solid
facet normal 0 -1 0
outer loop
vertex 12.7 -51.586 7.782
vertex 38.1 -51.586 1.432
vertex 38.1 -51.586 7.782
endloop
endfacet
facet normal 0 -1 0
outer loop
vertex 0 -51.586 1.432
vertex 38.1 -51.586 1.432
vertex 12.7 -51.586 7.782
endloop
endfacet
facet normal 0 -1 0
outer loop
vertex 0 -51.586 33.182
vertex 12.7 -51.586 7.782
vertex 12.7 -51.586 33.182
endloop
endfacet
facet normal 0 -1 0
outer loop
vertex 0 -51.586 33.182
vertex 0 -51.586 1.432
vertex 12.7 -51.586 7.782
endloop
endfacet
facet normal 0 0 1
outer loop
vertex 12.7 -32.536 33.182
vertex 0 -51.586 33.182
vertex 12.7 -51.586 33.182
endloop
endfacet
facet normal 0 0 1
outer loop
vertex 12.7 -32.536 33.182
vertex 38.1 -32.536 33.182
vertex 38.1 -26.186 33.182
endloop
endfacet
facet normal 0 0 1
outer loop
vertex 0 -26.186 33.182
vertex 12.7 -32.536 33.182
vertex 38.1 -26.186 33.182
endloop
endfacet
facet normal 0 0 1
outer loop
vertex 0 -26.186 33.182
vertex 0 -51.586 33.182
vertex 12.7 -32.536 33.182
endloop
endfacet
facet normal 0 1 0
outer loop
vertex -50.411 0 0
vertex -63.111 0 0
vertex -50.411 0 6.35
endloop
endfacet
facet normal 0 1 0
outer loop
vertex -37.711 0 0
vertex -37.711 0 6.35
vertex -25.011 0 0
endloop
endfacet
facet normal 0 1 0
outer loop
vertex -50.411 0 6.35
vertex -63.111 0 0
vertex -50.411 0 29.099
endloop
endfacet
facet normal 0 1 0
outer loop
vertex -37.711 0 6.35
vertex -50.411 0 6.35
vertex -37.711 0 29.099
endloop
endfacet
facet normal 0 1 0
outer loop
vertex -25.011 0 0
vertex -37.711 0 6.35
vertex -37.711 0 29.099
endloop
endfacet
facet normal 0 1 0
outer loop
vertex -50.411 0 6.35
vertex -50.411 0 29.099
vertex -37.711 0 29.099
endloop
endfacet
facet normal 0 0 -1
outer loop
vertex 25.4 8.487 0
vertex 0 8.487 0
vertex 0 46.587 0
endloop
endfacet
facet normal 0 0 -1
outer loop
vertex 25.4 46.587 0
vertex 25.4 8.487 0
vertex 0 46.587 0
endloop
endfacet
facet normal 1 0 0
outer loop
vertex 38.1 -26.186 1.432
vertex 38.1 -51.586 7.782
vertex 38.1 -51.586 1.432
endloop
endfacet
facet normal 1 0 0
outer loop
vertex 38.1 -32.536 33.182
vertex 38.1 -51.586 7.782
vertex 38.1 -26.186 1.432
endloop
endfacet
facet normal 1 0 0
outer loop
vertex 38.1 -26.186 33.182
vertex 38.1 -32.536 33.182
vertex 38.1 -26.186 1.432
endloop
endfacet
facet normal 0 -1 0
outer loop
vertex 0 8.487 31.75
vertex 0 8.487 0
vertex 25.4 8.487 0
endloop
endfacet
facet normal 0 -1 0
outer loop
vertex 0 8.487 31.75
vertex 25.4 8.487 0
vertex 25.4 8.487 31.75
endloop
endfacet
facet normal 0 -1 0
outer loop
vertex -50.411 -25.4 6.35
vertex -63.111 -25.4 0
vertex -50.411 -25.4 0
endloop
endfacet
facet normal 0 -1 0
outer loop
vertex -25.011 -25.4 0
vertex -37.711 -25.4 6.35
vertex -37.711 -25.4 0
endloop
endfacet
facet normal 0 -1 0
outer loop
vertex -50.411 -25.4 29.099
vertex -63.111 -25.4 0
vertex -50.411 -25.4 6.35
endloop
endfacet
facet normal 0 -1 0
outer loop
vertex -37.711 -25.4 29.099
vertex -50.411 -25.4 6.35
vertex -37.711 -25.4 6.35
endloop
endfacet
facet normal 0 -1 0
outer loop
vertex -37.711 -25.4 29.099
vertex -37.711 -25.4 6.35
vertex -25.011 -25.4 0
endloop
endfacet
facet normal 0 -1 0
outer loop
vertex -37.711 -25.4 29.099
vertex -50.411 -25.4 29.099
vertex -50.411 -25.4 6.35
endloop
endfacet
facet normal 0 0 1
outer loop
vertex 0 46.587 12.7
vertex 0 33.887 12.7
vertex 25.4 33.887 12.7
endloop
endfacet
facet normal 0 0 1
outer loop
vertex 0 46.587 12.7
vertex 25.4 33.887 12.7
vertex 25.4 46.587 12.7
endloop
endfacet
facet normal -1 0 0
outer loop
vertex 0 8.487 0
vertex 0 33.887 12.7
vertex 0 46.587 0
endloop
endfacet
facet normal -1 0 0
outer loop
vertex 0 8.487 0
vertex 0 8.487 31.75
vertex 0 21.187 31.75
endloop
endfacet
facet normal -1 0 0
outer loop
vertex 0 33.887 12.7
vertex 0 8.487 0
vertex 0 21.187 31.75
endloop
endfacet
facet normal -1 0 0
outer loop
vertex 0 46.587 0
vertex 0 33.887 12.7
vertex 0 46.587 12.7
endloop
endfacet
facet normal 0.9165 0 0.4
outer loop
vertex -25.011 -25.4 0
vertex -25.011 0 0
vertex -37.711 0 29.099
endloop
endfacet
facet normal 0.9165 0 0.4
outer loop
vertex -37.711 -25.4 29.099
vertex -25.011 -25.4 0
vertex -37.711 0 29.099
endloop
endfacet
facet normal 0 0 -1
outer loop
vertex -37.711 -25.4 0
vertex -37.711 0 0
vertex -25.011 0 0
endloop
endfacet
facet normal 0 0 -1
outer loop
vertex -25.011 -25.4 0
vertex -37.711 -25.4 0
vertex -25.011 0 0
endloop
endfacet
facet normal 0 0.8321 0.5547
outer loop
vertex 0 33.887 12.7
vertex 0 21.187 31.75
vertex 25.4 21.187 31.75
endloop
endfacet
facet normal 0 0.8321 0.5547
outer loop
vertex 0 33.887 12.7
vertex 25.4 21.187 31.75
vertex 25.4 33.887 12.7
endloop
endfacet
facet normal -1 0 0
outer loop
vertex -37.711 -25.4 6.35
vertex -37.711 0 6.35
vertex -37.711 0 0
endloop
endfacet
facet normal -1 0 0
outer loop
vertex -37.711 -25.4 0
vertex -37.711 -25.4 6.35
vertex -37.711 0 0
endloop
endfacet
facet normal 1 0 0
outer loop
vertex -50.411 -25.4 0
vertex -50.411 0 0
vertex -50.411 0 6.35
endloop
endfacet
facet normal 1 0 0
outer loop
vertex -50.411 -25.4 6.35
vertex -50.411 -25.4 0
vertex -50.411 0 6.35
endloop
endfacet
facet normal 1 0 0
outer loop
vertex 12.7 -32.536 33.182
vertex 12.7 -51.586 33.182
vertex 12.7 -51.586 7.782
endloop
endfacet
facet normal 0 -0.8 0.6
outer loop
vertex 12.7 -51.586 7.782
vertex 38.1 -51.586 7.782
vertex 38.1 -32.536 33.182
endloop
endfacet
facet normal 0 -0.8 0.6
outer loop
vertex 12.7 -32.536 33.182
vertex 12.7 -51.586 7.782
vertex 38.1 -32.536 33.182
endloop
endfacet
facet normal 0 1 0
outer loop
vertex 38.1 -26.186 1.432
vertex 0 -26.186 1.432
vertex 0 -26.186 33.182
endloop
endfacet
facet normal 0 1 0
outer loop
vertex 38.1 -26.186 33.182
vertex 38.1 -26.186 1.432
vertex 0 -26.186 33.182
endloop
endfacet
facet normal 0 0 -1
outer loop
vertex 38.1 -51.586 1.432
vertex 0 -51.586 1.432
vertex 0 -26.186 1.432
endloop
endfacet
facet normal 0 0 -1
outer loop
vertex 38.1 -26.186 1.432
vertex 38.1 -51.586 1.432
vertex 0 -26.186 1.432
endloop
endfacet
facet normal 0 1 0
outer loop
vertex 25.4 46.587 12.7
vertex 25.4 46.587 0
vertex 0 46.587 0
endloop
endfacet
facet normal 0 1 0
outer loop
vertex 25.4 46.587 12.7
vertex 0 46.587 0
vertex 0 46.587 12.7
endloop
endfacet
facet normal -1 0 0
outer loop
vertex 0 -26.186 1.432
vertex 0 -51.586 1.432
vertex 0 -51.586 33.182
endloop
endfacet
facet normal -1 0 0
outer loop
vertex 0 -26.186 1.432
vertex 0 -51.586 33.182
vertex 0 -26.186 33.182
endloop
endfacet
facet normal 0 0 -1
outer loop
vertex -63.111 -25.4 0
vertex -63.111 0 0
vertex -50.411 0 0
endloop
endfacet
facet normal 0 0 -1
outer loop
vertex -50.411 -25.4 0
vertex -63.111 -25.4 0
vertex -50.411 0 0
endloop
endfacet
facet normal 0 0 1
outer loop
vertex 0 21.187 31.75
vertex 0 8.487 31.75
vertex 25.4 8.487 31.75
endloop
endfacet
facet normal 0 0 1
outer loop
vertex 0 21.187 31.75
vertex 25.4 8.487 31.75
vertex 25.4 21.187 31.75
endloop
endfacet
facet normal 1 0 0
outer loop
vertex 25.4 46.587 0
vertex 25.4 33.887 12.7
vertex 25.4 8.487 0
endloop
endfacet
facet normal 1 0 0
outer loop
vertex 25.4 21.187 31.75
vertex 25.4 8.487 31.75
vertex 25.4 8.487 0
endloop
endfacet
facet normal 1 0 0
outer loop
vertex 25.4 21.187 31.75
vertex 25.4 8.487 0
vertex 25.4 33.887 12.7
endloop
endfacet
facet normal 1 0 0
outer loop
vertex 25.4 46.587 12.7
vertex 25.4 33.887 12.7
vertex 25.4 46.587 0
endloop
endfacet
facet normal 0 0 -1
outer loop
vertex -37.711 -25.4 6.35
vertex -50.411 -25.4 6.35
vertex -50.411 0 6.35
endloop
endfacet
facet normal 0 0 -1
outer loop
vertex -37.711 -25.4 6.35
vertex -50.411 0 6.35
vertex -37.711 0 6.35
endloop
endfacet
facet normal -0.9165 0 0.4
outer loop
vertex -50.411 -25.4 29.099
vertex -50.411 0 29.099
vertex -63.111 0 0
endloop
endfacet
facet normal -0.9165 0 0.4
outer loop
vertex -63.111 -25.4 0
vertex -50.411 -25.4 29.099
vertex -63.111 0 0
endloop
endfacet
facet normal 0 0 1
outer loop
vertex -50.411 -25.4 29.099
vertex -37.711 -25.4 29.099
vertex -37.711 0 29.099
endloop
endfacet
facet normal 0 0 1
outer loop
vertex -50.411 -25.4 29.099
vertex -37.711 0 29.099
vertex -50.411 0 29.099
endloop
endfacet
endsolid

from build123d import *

# Parameters (mm, degrees)
F0_W     = 25.4
F0_H     = 31.75
F1_DEPTH = 38.1
F3_DEPTH = 25.4
F4_W     = 38.1
F4_H     = 31.75
F5_DEPTH = 25.4
F7_DEPTH = 25.4
F9_DEPTH = 25.4


with BuildPart() as f1:
    # F0 (on Right) → F1 (new body)
    with BuildSketch(Plane.YZ):
        with Locations((-38.886014, 17.307128)):
            Rectangle(F0_W, F0_H)
    extrude(amount=F1_DEPTH)

    # F2 (on face) → F3 (cut)
    with BuildSketch(Plane.YZ.offset(38.1)):
        Polygon((-51.586014, 7.782128), (-32.536014, 33.182128), (-51.586014, 33.182128), align=None)
    extrude(amount=-F3_DEPTH, mode=Mode.SUBTRACT)


with BuildPart() as f5:
    # F4 (on Right) → F5 (new body)
    with BuildSketch(Plane.YZ):
        with Locations((27.536635, 15.875)):
            Rectangle(F4_W, F4_H)
    extrude(amount=F5_DEPTH)

    # F6 (on face) → F7 (cut)
    with BuildSketch(Plane.YZ.offset(25.4)):
        Polygon((33.886635, 12.7), (46.586635, 12.7), (46.586635, 31.75), (21.186635, 31.75), align=None)
    extrude(amount=-F7_DEPTH, mode=Mode.SUBTRACT)


with BuildPart() as f9:
    # F8 (on Front) → F9 (new body)
    with BuildSketch(Plane.XZ):
        Polygon((-50.411218, 29.099356), (-63.111218, 0), (-50.411218, 0), (-50.411218, 6.35), (-37.711218, 6.35), (-37.711218, 0), (-25.011218, 0), (-37.711218, 29.099356), align=None)
    extrude(amount=F9_DEPTH)


solid = Compound([f1.part, f5.part, f9.part])
